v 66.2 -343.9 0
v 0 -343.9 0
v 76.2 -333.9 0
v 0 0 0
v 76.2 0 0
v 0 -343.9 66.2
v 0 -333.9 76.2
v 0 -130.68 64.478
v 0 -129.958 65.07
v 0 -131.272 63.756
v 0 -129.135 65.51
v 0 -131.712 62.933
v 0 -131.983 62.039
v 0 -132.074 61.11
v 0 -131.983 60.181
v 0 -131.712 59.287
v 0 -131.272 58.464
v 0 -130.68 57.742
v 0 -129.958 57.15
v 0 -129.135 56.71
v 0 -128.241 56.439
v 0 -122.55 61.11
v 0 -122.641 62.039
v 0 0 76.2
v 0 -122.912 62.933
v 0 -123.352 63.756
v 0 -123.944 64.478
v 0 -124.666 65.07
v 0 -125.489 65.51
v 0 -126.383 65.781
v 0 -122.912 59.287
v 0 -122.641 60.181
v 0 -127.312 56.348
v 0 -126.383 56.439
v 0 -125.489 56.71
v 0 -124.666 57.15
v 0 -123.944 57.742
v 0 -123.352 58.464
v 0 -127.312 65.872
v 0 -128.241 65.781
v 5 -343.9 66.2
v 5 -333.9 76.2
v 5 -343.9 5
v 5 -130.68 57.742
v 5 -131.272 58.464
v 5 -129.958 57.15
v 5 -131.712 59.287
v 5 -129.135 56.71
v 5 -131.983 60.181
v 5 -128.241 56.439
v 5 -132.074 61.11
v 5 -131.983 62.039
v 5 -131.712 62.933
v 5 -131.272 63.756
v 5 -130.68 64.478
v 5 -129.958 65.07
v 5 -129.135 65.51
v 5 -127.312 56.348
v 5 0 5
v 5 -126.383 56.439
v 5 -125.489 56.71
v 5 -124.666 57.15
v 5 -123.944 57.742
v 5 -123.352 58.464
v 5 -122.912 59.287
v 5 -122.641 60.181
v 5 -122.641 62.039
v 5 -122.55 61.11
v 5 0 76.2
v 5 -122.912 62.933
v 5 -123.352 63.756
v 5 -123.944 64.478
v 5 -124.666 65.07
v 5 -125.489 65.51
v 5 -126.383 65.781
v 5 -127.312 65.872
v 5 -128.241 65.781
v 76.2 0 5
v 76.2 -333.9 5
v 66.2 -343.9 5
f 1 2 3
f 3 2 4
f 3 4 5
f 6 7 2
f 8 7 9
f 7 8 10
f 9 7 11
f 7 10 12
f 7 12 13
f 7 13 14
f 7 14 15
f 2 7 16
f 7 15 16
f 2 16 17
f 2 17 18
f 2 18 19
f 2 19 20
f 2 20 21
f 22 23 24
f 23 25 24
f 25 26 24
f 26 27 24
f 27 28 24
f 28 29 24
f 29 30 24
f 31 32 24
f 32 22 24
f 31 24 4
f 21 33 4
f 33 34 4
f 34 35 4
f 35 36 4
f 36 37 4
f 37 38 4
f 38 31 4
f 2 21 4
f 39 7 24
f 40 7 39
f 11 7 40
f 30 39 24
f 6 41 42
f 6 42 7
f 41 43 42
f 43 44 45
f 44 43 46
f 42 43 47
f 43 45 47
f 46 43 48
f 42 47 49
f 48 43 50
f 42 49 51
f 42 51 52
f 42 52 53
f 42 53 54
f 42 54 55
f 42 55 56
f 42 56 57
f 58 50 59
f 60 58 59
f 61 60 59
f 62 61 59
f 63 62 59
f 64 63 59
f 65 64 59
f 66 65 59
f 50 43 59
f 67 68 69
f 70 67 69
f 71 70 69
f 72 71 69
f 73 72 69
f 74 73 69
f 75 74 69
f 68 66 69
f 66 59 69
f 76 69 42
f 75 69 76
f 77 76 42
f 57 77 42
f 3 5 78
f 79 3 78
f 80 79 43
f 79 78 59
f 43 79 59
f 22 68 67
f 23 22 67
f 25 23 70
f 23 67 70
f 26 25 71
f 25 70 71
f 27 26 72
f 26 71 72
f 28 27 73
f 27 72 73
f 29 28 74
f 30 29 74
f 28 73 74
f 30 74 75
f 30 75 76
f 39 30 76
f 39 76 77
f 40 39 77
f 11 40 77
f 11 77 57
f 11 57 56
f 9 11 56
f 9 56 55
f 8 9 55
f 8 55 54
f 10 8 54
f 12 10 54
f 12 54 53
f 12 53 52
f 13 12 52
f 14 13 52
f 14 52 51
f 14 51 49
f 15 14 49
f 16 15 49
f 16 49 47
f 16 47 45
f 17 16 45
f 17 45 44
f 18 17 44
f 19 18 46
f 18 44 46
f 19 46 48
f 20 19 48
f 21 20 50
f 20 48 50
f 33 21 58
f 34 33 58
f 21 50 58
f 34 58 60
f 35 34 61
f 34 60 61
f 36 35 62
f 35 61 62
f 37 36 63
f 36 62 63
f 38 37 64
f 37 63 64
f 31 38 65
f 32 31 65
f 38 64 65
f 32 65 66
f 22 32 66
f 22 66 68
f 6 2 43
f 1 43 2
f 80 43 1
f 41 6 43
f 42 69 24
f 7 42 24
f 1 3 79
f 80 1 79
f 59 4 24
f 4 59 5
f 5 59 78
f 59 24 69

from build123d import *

# Parameters (mm, degrees)
F1_DEPTH = 343.9
F3_D     = 9.525
F4_SIZE  = 10


with BuildPart() as f1:
    # F0 (on Front) → F1 (new body)
    with BuildSketch(Plane.XZ):
        Polygon((0, 76.2), (0, 0), (76.2, 0), (76.2, 5), (5, 5), (5, 76.2), align=None)
    extrude(amount=F1_DEPTH)

    # F3 (through all)
    with Locations(Plane(origin=(0, 0, 0), x_dir=(0, -1, 0), z_dir=(-1, 0, 0))):
        with Locations((127.312, 61.11)):
            Hole(F3_D / 2)

    # F4
    f4_edges = [f1.edges().sort_by_distance(p)[0] for p in [
        (76.2, -343.9, 2.5),
        (2.5, -343.9, 76.2),
    ]]
    chamfer(f4_edges, length=F4_SIZE)


solid = f1.part
